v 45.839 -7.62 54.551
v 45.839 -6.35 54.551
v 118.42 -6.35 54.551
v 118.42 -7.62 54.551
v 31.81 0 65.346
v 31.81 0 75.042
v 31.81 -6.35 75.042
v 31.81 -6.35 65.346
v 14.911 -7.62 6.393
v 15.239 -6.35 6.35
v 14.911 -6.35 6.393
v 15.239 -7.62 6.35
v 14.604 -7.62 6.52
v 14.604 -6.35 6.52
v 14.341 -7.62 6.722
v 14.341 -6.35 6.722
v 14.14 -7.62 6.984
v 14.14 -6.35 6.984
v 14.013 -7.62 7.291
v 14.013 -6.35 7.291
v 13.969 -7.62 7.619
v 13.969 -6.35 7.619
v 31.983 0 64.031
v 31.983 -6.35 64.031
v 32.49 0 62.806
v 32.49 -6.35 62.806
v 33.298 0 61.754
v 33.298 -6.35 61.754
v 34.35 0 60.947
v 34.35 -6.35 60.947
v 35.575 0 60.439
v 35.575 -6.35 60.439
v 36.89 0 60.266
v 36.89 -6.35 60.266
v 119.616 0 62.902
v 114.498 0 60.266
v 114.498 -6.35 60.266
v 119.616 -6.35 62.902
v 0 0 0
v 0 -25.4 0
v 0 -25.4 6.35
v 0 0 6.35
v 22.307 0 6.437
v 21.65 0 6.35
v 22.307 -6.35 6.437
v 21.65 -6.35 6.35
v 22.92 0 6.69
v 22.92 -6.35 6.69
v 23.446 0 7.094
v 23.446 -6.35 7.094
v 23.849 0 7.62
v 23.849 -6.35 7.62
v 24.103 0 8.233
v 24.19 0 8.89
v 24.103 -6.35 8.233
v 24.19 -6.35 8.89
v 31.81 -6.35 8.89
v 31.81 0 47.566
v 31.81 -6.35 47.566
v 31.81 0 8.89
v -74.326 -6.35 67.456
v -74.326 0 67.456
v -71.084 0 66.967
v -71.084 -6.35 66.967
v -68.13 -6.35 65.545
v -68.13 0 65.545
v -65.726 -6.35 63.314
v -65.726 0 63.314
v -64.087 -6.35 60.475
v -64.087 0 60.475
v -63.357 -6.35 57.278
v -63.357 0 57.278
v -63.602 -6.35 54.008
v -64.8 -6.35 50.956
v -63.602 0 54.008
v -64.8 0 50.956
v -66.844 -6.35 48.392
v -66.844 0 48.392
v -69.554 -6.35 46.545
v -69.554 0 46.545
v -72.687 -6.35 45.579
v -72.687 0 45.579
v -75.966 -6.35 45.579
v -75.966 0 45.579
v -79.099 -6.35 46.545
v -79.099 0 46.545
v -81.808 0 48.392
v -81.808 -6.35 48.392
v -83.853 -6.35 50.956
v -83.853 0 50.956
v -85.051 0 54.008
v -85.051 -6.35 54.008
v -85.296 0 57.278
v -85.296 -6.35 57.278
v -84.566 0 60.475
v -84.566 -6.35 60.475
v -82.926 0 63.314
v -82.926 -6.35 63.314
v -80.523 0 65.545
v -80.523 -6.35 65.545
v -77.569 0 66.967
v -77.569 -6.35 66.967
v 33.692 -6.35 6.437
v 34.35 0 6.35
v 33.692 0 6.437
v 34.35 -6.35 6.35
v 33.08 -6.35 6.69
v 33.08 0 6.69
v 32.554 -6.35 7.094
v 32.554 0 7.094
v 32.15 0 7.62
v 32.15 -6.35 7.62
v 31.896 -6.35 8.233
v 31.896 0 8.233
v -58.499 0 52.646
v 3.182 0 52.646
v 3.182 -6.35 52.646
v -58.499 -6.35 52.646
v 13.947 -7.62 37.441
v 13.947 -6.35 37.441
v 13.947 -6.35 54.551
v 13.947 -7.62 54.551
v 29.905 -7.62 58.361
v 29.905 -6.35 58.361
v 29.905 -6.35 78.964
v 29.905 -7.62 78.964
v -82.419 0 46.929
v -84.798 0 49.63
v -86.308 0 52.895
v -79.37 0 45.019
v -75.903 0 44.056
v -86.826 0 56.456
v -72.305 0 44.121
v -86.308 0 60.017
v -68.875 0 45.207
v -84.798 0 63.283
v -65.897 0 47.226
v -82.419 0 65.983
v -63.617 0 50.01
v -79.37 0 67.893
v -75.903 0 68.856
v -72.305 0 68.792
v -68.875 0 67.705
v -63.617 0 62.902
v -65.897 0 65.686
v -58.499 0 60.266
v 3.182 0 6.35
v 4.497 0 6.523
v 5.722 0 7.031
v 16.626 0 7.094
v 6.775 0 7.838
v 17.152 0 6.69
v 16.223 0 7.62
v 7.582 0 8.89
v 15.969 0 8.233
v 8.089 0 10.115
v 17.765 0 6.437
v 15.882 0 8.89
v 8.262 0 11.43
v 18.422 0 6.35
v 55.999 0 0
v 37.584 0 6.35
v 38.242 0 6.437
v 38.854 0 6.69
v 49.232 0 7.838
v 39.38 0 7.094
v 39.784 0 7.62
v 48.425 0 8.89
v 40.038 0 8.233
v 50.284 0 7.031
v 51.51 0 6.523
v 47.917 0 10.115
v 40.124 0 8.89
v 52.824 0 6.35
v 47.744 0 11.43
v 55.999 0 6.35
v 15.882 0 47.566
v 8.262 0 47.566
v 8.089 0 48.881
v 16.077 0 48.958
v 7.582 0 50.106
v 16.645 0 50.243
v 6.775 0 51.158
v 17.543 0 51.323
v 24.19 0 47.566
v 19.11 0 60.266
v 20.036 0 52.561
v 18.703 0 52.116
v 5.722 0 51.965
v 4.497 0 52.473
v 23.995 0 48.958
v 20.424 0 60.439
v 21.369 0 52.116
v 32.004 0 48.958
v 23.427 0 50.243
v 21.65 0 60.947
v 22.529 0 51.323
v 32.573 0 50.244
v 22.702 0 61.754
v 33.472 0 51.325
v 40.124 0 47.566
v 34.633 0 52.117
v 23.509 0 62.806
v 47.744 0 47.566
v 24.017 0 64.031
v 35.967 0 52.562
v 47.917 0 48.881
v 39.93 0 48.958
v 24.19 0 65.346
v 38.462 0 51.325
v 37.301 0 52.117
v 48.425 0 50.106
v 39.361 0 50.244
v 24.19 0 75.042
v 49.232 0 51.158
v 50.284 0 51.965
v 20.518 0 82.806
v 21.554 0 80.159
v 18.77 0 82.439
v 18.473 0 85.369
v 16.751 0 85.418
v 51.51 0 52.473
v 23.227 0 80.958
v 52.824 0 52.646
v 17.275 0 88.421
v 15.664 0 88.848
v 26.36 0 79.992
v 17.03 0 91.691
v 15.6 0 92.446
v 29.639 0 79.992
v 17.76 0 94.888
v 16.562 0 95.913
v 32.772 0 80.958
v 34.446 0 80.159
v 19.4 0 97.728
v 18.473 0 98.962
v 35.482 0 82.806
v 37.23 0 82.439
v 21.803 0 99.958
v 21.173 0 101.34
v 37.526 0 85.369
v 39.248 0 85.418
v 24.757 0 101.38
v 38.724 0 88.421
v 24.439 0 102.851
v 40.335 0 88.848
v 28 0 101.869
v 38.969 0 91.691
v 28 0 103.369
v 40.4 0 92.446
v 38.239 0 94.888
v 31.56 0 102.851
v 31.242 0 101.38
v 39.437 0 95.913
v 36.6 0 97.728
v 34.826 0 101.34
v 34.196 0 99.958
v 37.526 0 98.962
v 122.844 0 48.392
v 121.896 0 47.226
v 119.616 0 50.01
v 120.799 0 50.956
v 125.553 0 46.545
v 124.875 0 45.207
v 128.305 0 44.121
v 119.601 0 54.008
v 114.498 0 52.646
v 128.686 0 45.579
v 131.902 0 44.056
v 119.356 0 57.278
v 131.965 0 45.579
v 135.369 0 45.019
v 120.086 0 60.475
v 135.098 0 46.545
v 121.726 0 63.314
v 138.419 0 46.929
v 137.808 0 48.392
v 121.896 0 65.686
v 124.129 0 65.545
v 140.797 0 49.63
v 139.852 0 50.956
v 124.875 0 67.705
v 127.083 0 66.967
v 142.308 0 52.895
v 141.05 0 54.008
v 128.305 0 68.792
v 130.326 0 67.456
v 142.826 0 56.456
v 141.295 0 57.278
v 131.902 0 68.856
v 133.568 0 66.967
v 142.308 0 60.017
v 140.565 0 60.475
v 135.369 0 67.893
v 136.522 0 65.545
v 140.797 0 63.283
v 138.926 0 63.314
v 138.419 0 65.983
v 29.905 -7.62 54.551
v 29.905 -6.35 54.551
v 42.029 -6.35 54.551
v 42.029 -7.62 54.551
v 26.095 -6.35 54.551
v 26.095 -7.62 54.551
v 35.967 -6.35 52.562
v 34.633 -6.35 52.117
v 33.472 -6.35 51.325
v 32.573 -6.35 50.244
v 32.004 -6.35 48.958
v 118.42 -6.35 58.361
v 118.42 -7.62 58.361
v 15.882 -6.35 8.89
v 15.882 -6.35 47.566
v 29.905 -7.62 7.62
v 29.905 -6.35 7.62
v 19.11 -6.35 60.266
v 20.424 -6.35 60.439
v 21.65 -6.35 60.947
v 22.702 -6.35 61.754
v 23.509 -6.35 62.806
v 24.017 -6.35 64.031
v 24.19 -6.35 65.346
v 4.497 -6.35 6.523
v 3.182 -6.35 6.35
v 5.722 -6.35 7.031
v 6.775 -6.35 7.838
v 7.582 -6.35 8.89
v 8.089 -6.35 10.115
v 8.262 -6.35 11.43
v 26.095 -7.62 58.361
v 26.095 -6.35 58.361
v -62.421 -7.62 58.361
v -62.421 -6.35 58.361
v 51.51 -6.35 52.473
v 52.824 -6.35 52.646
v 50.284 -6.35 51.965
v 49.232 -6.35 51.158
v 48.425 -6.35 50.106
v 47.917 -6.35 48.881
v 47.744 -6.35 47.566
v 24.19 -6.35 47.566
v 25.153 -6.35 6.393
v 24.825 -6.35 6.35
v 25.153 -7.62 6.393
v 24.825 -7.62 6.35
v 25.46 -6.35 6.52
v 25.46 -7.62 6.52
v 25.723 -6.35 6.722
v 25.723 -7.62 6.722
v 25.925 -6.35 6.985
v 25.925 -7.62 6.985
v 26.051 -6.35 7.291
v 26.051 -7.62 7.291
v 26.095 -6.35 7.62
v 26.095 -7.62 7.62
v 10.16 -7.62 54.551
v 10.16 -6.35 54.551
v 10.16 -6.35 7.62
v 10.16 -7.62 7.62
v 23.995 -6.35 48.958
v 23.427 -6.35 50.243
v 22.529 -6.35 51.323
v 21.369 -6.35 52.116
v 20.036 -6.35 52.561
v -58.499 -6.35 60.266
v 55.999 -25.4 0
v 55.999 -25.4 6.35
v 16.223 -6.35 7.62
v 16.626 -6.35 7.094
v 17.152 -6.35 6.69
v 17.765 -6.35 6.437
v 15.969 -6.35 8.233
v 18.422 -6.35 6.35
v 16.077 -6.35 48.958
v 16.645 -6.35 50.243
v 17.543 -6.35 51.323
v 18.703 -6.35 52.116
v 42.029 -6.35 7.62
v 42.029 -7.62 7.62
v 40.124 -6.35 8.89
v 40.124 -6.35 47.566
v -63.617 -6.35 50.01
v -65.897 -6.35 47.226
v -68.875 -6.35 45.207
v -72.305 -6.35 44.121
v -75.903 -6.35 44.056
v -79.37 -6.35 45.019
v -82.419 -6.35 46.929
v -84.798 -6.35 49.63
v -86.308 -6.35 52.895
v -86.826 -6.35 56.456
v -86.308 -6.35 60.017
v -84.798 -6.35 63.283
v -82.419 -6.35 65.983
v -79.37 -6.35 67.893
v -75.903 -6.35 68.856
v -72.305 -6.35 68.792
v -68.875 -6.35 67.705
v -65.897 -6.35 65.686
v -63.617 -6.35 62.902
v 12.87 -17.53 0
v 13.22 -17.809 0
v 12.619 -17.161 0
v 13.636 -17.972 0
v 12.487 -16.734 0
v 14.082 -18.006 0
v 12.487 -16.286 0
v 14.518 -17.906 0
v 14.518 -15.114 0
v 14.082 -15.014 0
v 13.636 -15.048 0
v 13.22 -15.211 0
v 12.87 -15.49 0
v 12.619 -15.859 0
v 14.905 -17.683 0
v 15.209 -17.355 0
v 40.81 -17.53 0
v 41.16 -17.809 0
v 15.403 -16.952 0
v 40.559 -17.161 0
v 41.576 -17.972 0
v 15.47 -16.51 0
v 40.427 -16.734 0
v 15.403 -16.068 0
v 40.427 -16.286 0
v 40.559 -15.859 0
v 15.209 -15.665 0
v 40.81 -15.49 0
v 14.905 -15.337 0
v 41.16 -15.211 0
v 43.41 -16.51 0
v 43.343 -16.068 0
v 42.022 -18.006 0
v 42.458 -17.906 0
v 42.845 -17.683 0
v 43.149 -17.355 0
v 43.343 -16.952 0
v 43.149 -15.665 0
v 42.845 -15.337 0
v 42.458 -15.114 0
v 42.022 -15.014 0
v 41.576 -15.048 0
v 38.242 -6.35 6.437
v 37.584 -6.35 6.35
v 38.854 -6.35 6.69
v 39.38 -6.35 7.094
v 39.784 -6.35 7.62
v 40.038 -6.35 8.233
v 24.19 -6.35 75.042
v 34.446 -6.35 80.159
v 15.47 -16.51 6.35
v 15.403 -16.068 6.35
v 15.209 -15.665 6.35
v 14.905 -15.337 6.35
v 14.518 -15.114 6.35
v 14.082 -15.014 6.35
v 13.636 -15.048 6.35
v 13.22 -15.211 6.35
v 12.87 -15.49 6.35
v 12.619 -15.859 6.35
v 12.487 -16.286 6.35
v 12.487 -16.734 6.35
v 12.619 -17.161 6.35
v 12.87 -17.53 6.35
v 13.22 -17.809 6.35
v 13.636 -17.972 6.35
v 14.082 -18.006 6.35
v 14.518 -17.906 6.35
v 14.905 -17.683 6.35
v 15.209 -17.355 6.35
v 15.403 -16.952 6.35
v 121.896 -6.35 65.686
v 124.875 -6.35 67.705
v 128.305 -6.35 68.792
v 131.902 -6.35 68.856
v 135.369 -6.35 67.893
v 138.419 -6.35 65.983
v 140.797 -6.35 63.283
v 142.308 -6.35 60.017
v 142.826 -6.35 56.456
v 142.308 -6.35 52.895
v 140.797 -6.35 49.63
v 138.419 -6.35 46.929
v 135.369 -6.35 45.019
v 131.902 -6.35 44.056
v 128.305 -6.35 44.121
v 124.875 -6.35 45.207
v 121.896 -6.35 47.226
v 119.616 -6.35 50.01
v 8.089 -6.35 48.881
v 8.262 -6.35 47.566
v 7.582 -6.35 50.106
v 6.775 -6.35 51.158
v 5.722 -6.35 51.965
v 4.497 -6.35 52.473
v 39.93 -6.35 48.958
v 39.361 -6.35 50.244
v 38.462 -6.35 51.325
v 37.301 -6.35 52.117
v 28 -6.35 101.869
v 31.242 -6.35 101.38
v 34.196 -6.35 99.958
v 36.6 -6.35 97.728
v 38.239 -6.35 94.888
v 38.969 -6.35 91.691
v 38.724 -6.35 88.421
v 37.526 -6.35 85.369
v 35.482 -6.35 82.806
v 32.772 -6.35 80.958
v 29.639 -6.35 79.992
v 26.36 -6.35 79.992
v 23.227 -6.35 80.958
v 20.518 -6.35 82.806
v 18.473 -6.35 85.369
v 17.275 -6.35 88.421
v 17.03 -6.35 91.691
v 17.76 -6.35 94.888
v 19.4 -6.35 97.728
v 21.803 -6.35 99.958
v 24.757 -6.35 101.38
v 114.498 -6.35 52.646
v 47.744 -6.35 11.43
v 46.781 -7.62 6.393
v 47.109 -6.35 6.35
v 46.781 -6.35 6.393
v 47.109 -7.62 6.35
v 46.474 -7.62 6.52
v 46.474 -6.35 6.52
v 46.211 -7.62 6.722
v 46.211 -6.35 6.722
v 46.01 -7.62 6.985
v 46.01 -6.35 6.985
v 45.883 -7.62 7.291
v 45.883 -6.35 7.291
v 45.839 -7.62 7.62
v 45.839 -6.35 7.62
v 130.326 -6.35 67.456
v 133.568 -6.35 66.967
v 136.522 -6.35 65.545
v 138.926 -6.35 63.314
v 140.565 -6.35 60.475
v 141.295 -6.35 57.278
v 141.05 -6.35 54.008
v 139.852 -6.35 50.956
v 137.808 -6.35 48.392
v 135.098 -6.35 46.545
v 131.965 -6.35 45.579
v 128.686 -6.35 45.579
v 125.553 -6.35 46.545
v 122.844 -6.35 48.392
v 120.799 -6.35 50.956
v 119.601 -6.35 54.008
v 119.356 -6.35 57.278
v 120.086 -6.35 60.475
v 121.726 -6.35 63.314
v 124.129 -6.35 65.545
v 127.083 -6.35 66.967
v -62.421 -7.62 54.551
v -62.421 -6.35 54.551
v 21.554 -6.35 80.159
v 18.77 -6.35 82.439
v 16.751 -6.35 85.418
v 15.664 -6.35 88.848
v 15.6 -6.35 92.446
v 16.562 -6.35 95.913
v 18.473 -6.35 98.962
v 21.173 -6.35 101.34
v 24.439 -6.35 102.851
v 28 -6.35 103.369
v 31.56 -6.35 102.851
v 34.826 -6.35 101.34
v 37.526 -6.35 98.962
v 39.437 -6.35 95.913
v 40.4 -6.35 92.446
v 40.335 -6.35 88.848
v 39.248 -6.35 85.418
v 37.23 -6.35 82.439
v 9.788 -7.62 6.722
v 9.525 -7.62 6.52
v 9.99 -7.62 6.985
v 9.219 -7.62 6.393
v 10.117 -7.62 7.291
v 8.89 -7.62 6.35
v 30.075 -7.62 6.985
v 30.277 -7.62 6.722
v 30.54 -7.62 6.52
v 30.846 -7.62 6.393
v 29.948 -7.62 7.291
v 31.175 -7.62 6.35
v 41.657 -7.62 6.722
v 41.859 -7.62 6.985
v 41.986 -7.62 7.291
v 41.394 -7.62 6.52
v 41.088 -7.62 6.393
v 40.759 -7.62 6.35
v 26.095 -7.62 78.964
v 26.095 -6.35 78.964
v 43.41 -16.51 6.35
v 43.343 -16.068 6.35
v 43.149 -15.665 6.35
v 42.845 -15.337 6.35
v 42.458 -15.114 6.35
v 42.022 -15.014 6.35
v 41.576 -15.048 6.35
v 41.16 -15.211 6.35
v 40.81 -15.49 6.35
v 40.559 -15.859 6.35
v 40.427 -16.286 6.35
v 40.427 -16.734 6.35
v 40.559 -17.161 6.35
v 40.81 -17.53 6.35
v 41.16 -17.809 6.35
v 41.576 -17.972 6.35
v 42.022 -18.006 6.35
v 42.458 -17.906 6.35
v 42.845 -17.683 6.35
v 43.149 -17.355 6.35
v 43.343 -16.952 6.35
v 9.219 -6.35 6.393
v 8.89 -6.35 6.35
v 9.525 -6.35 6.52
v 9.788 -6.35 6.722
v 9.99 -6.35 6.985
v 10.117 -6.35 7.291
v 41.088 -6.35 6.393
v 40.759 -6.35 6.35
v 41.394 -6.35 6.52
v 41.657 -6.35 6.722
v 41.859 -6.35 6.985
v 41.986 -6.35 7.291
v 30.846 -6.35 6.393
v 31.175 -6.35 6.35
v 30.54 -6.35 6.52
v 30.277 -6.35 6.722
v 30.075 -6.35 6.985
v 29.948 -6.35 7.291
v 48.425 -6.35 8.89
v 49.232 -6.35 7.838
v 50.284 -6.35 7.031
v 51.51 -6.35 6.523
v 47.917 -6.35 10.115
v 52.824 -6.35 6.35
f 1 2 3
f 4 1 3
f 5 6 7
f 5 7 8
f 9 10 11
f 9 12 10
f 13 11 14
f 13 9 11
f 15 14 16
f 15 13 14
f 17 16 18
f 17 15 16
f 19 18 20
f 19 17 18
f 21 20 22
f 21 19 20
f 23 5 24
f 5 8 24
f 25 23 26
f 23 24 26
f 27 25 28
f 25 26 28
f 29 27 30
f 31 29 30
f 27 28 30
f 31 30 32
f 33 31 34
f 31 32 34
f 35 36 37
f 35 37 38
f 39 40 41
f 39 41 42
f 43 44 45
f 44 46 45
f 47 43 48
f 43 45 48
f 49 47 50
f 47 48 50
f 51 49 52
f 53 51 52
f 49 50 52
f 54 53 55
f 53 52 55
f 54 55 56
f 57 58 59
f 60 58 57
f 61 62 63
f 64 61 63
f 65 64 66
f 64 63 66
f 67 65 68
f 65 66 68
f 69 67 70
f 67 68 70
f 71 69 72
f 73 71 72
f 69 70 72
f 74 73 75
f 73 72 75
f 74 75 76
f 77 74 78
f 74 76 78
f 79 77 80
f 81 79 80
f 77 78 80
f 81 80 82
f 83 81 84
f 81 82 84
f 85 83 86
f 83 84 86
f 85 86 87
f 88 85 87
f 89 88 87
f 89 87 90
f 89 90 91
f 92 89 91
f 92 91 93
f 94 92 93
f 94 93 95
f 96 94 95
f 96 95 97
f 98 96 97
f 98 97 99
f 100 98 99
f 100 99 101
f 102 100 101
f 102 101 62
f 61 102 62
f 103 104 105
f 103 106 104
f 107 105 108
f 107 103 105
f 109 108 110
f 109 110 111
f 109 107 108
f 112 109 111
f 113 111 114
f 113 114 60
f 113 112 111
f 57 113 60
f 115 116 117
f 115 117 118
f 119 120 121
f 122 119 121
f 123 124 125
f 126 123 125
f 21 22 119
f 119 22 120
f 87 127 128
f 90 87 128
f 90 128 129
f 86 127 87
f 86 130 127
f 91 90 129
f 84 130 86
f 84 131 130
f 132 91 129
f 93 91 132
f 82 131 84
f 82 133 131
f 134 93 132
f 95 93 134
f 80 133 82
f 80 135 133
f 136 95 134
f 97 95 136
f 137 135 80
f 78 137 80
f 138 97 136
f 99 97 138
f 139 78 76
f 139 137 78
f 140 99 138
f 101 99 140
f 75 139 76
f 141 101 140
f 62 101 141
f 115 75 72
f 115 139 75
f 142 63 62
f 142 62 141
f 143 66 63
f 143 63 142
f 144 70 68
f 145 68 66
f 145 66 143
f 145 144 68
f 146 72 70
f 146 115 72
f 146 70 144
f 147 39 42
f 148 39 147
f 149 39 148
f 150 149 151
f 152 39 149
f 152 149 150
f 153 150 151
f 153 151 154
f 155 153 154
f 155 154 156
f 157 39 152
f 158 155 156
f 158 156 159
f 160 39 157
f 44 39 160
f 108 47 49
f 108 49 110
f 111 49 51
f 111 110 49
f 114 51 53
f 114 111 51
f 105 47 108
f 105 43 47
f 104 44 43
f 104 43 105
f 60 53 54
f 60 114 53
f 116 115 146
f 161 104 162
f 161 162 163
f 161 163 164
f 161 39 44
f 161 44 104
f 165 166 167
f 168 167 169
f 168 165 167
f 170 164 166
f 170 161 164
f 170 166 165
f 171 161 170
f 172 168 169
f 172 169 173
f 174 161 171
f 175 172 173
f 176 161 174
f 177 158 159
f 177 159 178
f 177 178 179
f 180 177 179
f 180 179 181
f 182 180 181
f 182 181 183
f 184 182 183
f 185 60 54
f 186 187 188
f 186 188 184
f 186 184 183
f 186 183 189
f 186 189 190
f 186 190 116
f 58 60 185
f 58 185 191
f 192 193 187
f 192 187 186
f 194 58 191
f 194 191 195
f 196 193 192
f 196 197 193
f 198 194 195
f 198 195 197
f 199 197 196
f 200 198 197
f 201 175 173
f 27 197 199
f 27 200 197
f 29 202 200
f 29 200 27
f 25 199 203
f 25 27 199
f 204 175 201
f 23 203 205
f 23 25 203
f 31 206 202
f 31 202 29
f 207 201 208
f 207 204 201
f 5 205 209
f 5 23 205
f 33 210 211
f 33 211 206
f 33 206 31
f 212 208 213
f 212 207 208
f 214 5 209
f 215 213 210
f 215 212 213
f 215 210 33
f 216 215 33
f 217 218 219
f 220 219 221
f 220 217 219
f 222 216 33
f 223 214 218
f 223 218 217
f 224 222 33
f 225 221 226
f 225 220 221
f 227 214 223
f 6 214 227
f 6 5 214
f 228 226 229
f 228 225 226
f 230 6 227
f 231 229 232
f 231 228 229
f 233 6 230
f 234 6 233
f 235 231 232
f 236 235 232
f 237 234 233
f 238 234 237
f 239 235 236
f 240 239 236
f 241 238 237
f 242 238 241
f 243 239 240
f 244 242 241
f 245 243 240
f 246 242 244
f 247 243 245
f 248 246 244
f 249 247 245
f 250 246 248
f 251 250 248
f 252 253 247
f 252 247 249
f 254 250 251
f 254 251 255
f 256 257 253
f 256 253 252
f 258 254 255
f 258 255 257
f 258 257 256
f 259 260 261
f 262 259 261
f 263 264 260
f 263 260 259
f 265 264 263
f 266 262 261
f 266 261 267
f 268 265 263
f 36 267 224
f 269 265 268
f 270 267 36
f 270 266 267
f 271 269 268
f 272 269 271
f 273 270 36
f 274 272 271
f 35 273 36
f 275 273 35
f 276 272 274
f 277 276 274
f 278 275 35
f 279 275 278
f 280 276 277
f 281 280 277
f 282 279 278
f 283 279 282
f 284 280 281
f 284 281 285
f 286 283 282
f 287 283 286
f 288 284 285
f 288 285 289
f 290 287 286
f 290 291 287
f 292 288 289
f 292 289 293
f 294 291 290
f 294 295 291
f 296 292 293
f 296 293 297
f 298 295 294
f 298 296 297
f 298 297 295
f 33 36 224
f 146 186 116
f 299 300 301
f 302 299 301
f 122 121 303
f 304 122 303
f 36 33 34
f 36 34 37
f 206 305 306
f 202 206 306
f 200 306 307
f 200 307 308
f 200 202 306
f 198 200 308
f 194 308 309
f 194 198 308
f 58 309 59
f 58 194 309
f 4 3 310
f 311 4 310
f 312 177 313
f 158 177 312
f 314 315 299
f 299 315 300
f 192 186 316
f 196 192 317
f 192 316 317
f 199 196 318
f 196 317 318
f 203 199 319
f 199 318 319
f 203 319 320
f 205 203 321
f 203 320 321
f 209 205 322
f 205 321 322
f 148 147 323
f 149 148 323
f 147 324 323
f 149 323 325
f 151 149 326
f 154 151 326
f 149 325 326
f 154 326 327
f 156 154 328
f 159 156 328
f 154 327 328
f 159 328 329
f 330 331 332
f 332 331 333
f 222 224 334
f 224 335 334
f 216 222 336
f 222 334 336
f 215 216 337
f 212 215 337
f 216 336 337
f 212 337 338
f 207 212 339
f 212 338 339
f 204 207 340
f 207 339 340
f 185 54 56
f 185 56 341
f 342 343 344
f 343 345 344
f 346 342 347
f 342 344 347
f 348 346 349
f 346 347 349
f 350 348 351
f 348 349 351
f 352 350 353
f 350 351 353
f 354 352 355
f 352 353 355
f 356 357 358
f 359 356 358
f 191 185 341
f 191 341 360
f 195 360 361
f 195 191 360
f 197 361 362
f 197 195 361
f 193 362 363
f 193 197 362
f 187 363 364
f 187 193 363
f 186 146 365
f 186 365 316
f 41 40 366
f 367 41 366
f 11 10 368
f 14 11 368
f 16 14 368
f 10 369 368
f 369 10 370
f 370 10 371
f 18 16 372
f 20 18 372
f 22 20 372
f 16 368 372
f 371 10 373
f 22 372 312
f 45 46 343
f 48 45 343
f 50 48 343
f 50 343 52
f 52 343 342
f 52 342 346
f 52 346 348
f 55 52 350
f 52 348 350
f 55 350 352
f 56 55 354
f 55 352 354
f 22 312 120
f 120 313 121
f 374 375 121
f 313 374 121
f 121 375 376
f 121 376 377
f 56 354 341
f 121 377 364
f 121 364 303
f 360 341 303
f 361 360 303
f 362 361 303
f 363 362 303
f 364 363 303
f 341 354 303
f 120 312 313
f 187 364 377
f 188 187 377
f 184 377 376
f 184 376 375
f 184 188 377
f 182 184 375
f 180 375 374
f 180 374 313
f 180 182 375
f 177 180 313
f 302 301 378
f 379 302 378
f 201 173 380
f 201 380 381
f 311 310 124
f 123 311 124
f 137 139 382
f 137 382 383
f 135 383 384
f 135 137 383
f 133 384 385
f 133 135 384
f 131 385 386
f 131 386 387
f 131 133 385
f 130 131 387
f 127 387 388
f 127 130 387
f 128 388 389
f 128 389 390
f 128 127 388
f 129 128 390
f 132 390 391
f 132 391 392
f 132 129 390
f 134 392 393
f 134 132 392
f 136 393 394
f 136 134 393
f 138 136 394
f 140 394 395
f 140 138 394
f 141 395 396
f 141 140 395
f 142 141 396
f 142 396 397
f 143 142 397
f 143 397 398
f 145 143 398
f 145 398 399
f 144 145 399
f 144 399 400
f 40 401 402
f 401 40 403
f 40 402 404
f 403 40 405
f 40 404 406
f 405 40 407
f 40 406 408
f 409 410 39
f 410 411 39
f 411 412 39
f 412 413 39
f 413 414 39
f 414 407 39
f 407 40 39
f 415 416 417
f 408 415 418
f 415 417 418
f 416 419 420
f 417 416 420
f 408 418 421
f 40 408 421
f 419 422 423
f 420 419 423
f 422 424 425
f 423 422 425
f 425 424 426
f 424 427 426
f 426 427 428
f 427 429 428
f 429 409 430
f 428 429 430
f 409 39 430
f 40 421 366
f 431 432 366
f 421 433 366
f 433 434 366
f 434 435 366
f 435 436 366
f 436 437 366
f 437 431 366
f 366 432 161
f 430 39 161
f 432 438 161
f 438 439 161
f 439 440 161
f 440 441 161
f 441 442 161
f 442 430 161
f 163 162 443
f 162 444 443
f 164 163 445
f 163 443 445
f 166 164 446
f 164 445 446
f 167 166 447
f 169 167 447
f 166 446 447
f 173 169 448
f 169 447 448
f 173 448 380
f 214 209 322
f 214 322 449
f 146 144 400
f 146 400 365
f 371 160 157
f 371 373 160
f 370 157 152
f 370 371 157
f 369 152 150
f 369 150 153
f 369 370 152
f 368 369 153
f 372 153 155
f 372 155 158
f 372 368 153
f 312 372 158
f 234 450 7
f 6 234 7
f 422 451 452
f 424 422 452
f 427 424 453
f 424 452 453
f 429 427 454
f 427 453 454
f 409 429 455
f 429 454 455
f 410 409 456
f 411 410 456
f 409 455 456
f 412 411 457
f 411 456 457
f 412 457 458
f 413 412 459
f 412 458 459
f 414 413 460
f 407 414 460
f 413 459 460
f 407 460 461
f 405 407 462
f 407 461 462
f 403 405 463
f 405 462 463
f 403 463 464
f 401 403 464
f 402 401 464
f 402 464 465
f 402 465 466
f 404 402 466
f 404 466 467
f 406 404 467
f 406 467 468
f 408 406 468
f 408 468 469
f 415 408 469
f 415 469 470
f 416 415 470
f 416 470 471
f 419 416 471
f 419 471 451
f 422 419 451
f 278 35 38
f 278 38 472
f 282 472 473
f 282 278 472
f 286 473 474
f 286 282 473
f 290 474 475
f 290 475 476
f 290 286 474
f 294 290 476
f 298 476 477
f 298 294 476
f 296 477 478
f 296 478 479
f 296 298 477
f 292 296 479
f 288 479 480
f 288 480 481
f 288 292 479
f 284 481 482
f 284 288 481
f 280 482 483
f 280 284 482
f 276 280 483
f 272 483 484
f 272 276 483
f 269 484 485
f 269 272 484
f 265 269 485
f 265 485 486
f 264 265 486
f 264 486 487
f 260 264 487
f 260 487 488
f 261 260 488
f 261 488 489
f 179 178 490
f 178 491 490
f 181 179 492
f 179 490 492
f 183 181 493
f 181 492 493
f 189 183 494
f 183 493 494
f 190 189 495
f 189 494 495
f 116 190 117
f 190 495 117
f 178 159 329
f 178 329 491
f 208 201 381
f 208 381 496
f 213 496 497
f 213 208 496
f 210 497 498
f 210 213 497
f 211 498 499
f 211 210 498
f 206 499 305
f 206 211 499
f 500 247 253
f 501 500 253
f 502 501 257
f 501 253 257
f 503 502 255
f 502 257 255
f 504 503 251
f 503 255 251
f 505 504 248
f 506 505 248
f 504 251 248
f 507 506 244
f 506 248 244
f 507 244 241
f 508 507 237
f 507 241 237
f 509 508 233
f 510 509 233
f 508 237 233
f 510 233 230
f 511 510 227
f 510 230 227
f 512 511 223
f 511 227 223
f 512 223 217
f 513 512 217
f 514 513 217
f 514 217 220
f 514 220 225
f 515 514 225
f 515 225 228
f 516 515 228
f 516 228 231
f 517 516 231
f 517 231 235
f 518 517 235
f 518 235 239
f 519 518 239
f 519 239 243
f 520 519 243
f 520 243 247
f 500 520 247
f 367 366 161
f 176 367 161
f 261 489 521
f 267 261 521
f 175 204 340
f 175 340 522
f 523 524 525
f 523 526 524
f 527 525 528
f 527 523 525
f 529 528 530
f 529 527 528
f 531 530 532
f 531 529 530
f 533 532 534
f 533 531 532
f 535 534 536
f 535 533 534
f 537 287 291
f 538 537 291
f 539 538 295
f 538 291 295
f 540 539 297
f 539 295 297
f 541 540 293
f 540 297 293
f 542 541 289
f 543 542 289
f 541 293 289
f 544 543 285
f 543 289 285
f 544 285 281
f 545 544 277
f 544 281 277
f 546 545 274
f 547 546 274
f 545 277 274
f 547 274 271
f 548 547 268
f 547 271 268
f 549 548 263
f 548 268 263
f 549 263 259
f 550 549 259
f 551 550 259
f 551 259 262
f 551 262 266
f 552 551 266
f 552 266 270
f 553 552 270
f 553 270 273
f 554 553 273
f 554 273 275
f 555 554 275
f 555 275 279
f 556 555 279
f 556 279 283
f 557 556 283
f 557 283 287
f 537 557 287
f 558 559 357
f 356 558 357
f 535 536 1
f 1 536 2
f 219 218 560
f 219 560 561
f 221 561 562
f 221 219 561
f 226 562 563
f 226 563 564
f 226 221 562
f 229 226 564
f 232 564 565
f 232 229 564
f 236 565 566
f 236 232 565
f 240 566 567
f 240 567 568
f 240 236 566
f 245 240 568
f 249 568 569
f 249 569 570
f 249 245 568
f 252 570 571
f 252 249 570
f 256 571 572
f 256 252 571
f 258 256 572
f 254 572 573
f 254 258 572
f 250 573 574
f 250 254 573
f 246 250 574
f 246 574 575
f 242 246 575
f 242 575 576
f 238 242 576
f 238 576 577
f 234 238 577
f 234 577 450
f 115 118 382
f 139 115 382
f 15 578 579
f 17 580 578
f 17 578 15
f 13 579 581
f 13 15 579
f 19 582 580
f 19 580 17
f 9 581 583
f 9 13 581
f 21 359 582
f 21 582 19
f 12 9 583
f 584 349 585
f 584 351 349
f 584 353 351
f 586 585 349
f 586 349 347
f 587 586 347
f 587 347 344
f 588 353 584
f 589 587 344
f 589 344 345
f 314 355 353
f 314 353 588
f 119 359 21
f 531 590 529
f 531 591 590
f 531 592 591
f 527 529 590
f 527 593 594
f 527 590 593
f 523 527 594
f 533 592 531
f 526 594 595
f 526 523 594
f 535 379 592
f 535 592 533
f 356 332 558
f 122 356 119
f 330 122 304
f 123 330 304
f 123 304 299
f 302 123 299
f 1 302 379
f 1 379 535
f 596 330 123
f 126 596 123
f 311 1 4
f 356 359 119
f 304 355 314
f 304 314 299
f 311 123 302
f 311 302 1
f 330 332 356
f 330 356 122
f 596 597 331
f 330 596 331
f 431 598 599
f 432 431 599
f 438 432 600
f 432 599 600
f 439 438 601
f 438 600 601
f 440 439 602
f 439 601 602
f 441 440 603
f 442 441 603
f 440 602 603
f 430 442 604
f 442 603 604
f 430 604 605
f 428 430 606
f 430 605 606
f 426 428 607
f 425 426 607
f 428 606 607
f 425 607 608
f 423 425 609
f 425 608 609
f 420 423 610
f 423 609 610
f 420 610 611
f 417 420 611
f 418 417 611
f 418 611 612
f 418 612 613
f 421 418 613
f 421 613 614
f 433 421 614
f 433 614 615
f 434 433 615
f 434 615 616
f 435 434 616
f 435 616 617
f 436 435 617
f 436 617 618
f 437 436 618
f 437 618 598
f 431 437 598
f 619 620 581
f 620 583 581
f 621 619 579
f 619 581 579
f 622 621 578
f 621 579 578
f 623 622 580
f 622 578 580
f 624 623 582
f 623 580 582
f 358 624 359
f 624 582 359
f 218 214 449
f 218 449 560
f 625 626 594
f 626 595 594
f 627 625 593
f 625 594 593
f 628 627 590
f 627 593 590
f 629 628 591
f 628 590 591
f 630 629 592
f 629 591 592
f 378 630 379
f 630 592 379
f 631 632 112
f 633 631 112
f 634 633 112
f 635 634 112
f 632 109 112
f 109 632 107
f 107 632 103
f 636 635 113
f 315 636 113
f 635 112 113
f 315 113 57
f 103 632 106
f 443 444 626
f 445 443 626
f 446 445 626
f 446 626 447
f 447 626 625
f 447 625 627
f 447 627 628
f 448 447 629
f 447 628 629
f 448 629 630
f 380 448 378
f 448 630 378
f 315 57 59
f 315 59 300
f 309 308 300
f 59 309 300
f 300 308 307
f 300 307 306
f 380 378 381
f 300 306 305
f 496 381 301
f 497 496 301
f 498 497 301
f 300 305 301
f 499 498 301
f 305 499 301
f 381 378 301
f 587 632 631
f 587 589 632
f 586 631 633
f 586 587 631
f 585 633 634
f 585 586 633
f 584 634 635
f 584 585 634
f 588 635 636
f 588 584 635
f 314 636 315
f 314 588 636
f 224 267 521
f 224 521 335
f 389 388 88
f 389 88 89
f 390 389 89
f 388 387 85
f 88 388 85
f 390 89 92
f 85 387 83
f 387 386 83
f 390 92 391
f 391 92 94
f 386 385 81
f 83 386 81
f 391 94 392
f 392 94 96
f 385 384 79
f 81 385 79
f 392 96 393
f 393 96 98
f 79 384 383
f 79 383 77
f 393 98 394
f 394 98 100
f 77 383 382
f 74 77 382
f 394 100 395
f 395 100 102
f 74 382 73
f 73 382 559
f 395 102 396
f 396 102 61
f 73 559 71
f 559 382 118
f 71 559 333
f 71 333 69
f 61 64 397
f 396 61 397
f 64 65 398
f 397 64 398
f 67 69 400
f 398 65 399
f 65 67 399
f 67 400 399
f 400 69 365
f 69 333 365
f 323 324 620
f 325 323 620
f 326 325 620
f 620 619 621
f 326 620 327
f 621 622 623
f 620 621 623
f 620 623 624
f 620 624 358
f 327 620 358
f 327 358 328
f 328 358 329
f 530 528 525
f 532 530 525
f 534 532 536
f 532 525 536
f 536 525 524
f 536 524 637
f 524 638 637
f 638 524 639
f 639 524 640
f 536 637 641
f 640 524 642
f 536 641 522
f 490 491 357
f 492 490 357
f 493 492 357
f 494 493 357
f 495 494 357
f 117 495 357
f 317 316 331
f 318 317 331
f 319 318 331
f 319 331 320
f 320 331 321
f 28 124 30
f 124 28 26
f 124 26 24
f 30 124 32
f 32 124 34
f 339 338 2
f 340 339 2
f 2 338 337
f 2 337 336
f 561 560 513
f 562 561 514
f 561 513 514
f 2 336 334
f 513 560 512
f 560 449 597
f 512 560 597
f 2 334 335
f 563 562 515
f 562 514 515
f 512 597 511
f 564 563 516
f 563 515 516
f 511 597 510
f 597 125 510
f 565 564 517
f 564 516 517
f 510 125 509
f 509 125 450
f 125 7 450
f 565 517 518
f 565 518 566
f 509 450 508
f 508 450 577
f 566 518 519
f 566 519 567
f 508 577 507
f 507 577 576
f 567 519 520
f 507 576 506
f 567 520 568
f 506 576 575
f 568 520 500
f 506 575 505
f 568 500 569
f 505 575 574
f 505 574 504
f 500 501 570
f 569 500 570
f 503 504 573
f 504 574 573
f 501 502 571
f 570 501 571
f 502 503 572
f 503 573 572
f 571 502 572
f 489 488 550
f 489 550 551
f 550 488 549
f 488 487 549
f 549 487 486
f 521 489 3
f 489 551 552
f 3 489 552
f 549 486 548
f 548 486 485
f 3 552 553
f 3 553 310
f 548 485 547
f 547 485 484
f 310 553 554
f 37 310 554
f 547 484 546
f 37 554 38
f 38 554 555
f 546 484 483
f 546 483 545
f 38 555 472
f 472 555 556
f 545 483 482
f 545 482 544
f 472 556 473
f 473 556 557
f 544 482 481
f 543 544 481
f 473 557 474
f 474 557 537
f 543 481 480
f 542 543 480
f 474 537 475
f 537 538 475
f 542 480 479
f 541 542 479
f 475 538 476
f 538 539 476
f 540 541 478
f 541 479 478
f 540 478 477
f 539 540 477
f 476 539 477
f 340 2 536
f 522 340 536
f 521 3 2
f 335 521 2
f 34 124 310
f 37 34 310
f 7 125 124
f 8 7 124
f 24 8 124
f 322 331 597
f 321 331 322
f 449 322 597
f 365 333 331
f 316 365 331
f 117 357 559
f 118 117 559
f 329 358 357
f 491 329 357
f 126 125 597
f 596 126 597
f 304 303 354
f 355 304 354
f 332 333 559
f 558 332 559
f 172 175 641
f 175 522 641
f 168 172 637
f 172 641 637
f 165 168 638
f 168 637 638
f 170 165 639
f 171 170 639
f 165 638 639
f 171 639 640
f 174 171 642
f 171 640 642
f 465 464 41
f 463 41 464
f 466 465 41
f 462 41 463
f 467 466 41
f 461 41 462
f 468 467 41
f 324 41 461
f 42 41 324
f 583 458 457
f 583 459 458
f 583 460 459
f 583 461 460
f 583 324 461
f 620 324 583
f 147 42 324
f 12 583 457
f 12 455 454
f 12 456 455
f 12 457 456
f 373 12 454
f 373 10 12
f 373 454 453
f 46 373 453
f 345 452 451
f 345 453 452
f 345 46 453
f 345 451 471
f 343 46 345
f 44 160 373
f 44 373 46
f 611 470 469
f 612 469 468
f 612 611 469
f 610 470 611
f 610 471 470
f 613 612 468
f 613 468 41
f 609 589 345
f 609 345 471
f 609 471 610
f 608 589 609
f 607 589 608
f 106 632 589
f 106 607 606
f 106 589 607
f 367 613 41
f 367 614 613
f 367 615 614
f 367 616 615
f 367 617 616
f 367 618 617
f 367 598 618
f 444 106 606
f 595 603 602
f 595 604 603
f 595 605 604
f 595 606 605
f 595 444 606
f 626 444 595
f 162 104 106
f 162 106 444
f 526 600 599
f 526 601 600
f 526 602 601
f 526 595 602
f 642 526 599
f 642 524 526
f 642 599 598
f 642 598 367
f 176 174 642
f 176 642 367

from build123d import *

# Parameters (mm, degrees)
SKETCH1_W           = 55.99938
SKETCH1_H           = 25.4
BOSS_EXTRUDE1_DEPTH = 6.35
BOSS_EXTRUDE2_DEPTH = 6.35
SKETCH10_R          = 10.999999971
CUT_EXTRUDE3_DEPTH  = 179.12779542
FILLET1_R           = 5.08
FILLET2_R           = 5.08
FILLET3_R           = 5.08
FILLET4_R           = 5.08
FILLET5_R           = 5.08
FILLET6_R           = 5.08
FILLET7_R           = 2.54
SKETCH9_R           = 1.5
CUT_EXTRUDE2_DEPTH  = 175.519471736
BOSS_EXTRUDE3_DEPTH = 1.27
FILLET8_R           = 1.27
CHAMFER1_SIZE       = 3.922074982
CHAMFER3_SIZE       = 3.922074982
CHAMFER4_SIZE       = 3.922074982


with BuildPart() as part:
    # Sketch1 → Boss-Extrude1 (new body)
    with BuildSketch(Plane.XY):
        with Locations((27.99969, -12.7)):
            Rectangle(SKETCH1_W, SKETCH1_H)
    extrude(amount=BOSS_EXTRUDE1_DEPTH)

    # Sketch2 → Boss-Extrude2 (add)
    with BuildSketch(Plane(origin=(0, 0, 0), x_dir=(1, 0, 0), z_dir=(0, 1, 0))):
        with BuildLine():
            ThreePointArc((118.420471835, -60.26605485), (142.825676579, -56.45605485), (118.420471835, -52.64605485))
            Line((118.420471835, -52.64605485), (47.74438, -52.64605485))
            Line((47.74438, -52.64605485), (47.74438, -6.35))
            Line((47.74438, -6.35), (40.124318317, -6.35))
            Line((40.124318317, -6.35), (40.124318317, -52.64605485))
            Line((40.124318317, -52.64605485), (31.80969, -52.64605485))
            Line((31.80969, -52.64605485), (31.80969, -6.35))
            Line((31.80969, -6.35), (24.18969, -6.35))
            Line((24.18969, -6.35), (24.18969, -52.64605485))
            Line((24.18969, -52.64605485), (15.882493554, -52.64605485))
            Line((15.882493554, -52.64605485), (15.882493554, -6.35))
            Line((15.882493554, -6.35), (8.262493554, -6.35))
            Line((8.262493554, -6.35), (8.262493554, -52.64605485))
            Line((8.262493554, -52.64605485), (-62.421091835, -52.64605485))
            ThreePointArc((-62.421091835, -52.64605485), (-86.826296579, -56.45605485), (-62.421091835, -60.26605485))
            Line((-62.421091835, -60.26605485), (24.18969, -60.26605485))
            Line((24.18969, -60.26605485), (24.18969, -78.963928031))
            ThreePointArc((24.18969, -78.963928031), (27.99969, -103.369132775), (31.80969, -78.963928031))
            Line((31.80969, -78.963928031), (31.80969, -60.26605485))
            Line((31.80969, -60.26605485), (118.420471835, -60.26605485))
        make_face()
    extrude(amount=-BOSS_EXTRUDE2_DEPTH)

    # Sketch10 → Cut-Extrude3 (cut, through all)
    with BuildSketch(Plane(origin=(0, 0, 0), x_dir=(1, 0, 0), z_dir=(0, 1, 0))):
        with Locations(Location((-74.326296579, -56.45605485, 0), (0, 0, 270))):
            Circle(SKETCH10_R)
        with Locations(Location((27.99969, -90.869132775, 0), (0, 0, 270))):
            Circle(SKETCH10_R)
        with Locations(Location((130.325676579, -56.45605485, 0), (0, 0, 270))):
            Circle(SKETCH10_R)
    extrude(amount=-CUT_EXTRUDE3_DEPTH, mode=Mode.SUBTRACT)

    # Fillet1
    fillet1_edges = [part.edges().sort_by_distance(p)[0] for p in [
        (8.262493554, -3.175, 6.35),
    ]]
    fillet(fillet1_edges, radius=FILLET1_R)

    # Fillet2
    fillet2_edges = [part.edges().sort_by_distance(p)[0] for p in [
        (47.74438, -3.175, 6.35),
    ]]
    fillet(fillet2_edges, radius=FILLET2_R)

    # Fillet3
    fillet3_edges = [part.edges().sort_by_distance(p)[0] for p in [
        (47.74438, -3.175, 52.64605485),
    ]]
    fillet(fillet3_edges, radius=FILLET3_R)

    # Fillet4
    fillet4_edges = [part.edges().sort_by_distance(p)[0] for p in [
        (8.262493554, -3.175, 52.64605485),
    ]]
    fillet(fillet4_edges, radius=FILLET4_R)

    # Fillet5
    fillet5_edges = [part.edges().sort_by_distance(p)[0] for p in [
        (31.80969, -3.175, 60.26605485),
        (24.18969, -3.175, 60.26605485),
    ]]
    fillet(fillet5_edges, radius=FILLET5_R)

    # Fillet6
    # the kernel refuses this fillet: 5.08 mm, written as the material it adds along each edge
    with BuildSketch(Plane(origin=(40.124318317, 0, 52.64605485), x_dir=(0, 0, -1), z_dir=(0, -1, 0)), Plane(origin=(24.18969, 0, 52.64605485), x_dir=(0, 0, -1), z_dir=(0, -1, 0))) as fillet6_piece_1:
        with BuildLine():
            CenterArc((FILLET6_R, -FILLET6_R), FILLET6_R, 90, 90)
            Line((0, -FILLET6_R), (0, 0))
            Line((0, 0), (FILLET6_R, 0))
        make_face()
    extrude(amount=6.35)
    with BuildSketch(Plane(origin=(31.80969, 0, 52.64605485), x_dir=(0, 0, -1), z_dir=(0, -1, 0)), Plane(origin=(15.882493554, 0, 52.64605485), x_dir=(0, 0, -1), z_dir=(0, -1, 0))) as fillet6_piece_2:
        with BuildLine():
            CenterArc((FILLET6_R, FILLET6_R), FILLET6_R, 180, 90)
            Line((0, FILLET6_R), (0, 0))
            Line((0, 0), (FILLET6_R, 0))
        make_face()
    extrude(amount=6.35)

    # Fillet7
    fillet7_edges = [part.edges().sort_by_distance(p)[0] for p in [
        (15.882493554, -3.175, 6.35),
        (24.18969, -3.175, 6.35),
        (31.80969, -3.175, 6.35),
        (40.124318317, -3.175, 6.35),
    ]]
    fillet(fillet7_edges, radius=FILLET7_R)

    # Sketch9 → Cut-Extrude2 (cut, through all)
    with BuildSketch(Plane.XY.offset(6.35)):
        with Locations((13.97, -16.51)):
            Circle(SKETCH9_R)
        with Locations((41.91, -16.51)):
            Circle(SKETCH9_R)
    extrude(amount=-CUT_EXTRUDE2_DEPTH, mode=Mode.SUBTRACT)

    # Sketch13 → Boss-Extrude3 (add)
    with BuildSketch(Plane.XZ.offset(6.35)):
        Polygon((-62.421091835, 58.361061908), (-62.421091835, 54.55105485), (10.160000409, 54.55105485), (10.160000409, 6.35), (13.97, 6.35), (13.946786012, 37.440717912), (13.946786012, 54.55105485), (26.09469, 54.55105485), (26.09469, 6.35), (29.90469, 6.35), (29.90469, 54.55105485), (42.02938, 54.55105485), (42.02938, 6.35), (45.83938, 6.35), (45.83938, 54.55105485), (118.420471835, 54.55105485), (118.420471835, 58.361061908), (29.90469, 58.361061908), (29.90469, 78.963928031), (26.09469, 78.963928031), (26.09469, 58.361061908), align=None)
    extrude(amount=BOSS_EXTRUDE3_DEPTH)

    # Fillet8
    fillet8_edges = [part.edges().sort_by_distance(p)[0] for p in [
        (10.160000409, -6.985, 6.35),
        (13.97, -6.985, 6.35),
        (42.02938, -6.985, 6.35),
        (45.83938, -6.985, 6.35),
        (26.09469, -6.985, 6.35),
        (29.90469, -6.985, 6.35),
    ]]
    fillet(fillet8_edges, radius=FILLET8_R)

    # Chamfer1
    # the kernel refuses this chamfer: 3.922074982, 2.54 mm, written as the material it adds along each edge
    with BuildSketch(Plane(origin=(-62.421091835, 0, 52.64605485), x_dir=(1, 0, 0), z_dir=(0, -1, 0))) as chamfer1_piece_1:
        with BuildLine():
            Line((CHAMFER1_SIZE, 0), (-1.195552336, -2.636188431))
            ThreePointArc((-1.195552336, -2.636188431), (-0.547031751, -1.409377958), (0, 0))
            Line((0, 0), (CHAMFER1_SIZE, 0))
        make_face()
    extrude(amount=6.35)
    with BuildSketch(Plane(origin=(-62.421091835, 0, 60.26605485), x_dir=(-0.4130254162108394, 0, 0.9107194988380687), z_dir=(0, -1, 0))) as chamfer1_piece_2:
        with BuildLine():
            Line((2.894621708, 0), (-CHAMFER1_SIZE * 0.413025416196, -CHAMFER1_SIZE * 0.910719498804))
            Line((-CHAMFER1_SIZE * 0.413025416196, -CHAMFER1_SIZE * 0.910719498804), (0, 0))
            ThreePointArc((0, 0), (1.509486004, -0.083916435), (2.894621708, 0))
        make_face()
    extrude(amount=6.35)

    # Chamfer3
    # the kernel refuses this chamfer: 3.922074982, 2.54 mm, written as the material it adds along each edge
    with BuildSketch(Plane(origin=(118.420471835, 0, 52.64605485), x_dir=(0.4130254162108416, 0, -0.9107194988380676), z_dir=(0, -1, 0))) as chamfer3_piece_1:
        with BuildLine():
            Line((2.894621708, 0), (-CHAMFER3_SIZE * 0.413025416196, -CHAMFER3_SIZE * 0.910719498804))
            Line((-CHAMFER3_SIZE * 0.413025416196, -CHAMFER3_SIZE * 0.910719498804), (0, 0))
            ThreePointArc((0, 0), (1.509486004, -0.083916435), (2.894621708, 0))
        make_face()
    extrude(amount=6.35)
    with BuildSketch(Plane(origin=(118.420471835, 0, 60.26605485), x_dir=(-1, 0, 0), z_dir=(0, -1, 0))) as chamfer3_piece_2:
        with BuildLine():
            Line((CHAMFER3_SIZE, 0), (-1.195552336, -2.636188431))
            ThreePointArc((-1.195552336, -2.636188431), (-0.547031751, -1.409377958), (0, 0))
            Line((0, 0), (CHAMFER3_SIZE, 0))
        make_face()
    extrude(amount=6.35)

    # Chamfer4
    # the kernel refuses this chamfer: 3.922074982, 2.54 mm, written as the material it adds along each edge
    with BuildSketch(Plane(origin=(31.80969, 0, 78.963928031), x_dir=(0.9107194988380676, 0, 0.4130254162108416), z_dir=(0, -1, 0))) as chamfer4_piece_1:
        with BuildLine():
            Line((2.894621708, 0), (-CHAMFER4_SIZE * 0.413025416196, -CHAMFER4_SIZE * 0.910719498804))
            Line((-CHAMFER4_SIZE * 0.413025416196, -CHAMFER4_SIZE * 0.910719498804), (0, 0))
            ThreePointArc((0, 0), (1.509486004, -0.083916435), (2.894621708, 0))
        make_face()
    extrude(amount=6.35)
    with BuildSketch(Plane(origin=(24.18969, 0, 78.963928031), x_dir=(0, 0, -1), z_dir=(0, -1, 0))) as chamfer4_piece_2:
        with BuildLine():
            Line((CHAMFER4_SIZE, 0), (-1.195552336, -2.636188431))
            ThreePointArc((-1.195552336, -2.636188431), (-0.547031751, -1.409377958), (0, 0))
            Line((0, 0), (CHAMFER4_SIZE, 0))
        make_face()
    extrude(amount=6.35)


solid = part.part
